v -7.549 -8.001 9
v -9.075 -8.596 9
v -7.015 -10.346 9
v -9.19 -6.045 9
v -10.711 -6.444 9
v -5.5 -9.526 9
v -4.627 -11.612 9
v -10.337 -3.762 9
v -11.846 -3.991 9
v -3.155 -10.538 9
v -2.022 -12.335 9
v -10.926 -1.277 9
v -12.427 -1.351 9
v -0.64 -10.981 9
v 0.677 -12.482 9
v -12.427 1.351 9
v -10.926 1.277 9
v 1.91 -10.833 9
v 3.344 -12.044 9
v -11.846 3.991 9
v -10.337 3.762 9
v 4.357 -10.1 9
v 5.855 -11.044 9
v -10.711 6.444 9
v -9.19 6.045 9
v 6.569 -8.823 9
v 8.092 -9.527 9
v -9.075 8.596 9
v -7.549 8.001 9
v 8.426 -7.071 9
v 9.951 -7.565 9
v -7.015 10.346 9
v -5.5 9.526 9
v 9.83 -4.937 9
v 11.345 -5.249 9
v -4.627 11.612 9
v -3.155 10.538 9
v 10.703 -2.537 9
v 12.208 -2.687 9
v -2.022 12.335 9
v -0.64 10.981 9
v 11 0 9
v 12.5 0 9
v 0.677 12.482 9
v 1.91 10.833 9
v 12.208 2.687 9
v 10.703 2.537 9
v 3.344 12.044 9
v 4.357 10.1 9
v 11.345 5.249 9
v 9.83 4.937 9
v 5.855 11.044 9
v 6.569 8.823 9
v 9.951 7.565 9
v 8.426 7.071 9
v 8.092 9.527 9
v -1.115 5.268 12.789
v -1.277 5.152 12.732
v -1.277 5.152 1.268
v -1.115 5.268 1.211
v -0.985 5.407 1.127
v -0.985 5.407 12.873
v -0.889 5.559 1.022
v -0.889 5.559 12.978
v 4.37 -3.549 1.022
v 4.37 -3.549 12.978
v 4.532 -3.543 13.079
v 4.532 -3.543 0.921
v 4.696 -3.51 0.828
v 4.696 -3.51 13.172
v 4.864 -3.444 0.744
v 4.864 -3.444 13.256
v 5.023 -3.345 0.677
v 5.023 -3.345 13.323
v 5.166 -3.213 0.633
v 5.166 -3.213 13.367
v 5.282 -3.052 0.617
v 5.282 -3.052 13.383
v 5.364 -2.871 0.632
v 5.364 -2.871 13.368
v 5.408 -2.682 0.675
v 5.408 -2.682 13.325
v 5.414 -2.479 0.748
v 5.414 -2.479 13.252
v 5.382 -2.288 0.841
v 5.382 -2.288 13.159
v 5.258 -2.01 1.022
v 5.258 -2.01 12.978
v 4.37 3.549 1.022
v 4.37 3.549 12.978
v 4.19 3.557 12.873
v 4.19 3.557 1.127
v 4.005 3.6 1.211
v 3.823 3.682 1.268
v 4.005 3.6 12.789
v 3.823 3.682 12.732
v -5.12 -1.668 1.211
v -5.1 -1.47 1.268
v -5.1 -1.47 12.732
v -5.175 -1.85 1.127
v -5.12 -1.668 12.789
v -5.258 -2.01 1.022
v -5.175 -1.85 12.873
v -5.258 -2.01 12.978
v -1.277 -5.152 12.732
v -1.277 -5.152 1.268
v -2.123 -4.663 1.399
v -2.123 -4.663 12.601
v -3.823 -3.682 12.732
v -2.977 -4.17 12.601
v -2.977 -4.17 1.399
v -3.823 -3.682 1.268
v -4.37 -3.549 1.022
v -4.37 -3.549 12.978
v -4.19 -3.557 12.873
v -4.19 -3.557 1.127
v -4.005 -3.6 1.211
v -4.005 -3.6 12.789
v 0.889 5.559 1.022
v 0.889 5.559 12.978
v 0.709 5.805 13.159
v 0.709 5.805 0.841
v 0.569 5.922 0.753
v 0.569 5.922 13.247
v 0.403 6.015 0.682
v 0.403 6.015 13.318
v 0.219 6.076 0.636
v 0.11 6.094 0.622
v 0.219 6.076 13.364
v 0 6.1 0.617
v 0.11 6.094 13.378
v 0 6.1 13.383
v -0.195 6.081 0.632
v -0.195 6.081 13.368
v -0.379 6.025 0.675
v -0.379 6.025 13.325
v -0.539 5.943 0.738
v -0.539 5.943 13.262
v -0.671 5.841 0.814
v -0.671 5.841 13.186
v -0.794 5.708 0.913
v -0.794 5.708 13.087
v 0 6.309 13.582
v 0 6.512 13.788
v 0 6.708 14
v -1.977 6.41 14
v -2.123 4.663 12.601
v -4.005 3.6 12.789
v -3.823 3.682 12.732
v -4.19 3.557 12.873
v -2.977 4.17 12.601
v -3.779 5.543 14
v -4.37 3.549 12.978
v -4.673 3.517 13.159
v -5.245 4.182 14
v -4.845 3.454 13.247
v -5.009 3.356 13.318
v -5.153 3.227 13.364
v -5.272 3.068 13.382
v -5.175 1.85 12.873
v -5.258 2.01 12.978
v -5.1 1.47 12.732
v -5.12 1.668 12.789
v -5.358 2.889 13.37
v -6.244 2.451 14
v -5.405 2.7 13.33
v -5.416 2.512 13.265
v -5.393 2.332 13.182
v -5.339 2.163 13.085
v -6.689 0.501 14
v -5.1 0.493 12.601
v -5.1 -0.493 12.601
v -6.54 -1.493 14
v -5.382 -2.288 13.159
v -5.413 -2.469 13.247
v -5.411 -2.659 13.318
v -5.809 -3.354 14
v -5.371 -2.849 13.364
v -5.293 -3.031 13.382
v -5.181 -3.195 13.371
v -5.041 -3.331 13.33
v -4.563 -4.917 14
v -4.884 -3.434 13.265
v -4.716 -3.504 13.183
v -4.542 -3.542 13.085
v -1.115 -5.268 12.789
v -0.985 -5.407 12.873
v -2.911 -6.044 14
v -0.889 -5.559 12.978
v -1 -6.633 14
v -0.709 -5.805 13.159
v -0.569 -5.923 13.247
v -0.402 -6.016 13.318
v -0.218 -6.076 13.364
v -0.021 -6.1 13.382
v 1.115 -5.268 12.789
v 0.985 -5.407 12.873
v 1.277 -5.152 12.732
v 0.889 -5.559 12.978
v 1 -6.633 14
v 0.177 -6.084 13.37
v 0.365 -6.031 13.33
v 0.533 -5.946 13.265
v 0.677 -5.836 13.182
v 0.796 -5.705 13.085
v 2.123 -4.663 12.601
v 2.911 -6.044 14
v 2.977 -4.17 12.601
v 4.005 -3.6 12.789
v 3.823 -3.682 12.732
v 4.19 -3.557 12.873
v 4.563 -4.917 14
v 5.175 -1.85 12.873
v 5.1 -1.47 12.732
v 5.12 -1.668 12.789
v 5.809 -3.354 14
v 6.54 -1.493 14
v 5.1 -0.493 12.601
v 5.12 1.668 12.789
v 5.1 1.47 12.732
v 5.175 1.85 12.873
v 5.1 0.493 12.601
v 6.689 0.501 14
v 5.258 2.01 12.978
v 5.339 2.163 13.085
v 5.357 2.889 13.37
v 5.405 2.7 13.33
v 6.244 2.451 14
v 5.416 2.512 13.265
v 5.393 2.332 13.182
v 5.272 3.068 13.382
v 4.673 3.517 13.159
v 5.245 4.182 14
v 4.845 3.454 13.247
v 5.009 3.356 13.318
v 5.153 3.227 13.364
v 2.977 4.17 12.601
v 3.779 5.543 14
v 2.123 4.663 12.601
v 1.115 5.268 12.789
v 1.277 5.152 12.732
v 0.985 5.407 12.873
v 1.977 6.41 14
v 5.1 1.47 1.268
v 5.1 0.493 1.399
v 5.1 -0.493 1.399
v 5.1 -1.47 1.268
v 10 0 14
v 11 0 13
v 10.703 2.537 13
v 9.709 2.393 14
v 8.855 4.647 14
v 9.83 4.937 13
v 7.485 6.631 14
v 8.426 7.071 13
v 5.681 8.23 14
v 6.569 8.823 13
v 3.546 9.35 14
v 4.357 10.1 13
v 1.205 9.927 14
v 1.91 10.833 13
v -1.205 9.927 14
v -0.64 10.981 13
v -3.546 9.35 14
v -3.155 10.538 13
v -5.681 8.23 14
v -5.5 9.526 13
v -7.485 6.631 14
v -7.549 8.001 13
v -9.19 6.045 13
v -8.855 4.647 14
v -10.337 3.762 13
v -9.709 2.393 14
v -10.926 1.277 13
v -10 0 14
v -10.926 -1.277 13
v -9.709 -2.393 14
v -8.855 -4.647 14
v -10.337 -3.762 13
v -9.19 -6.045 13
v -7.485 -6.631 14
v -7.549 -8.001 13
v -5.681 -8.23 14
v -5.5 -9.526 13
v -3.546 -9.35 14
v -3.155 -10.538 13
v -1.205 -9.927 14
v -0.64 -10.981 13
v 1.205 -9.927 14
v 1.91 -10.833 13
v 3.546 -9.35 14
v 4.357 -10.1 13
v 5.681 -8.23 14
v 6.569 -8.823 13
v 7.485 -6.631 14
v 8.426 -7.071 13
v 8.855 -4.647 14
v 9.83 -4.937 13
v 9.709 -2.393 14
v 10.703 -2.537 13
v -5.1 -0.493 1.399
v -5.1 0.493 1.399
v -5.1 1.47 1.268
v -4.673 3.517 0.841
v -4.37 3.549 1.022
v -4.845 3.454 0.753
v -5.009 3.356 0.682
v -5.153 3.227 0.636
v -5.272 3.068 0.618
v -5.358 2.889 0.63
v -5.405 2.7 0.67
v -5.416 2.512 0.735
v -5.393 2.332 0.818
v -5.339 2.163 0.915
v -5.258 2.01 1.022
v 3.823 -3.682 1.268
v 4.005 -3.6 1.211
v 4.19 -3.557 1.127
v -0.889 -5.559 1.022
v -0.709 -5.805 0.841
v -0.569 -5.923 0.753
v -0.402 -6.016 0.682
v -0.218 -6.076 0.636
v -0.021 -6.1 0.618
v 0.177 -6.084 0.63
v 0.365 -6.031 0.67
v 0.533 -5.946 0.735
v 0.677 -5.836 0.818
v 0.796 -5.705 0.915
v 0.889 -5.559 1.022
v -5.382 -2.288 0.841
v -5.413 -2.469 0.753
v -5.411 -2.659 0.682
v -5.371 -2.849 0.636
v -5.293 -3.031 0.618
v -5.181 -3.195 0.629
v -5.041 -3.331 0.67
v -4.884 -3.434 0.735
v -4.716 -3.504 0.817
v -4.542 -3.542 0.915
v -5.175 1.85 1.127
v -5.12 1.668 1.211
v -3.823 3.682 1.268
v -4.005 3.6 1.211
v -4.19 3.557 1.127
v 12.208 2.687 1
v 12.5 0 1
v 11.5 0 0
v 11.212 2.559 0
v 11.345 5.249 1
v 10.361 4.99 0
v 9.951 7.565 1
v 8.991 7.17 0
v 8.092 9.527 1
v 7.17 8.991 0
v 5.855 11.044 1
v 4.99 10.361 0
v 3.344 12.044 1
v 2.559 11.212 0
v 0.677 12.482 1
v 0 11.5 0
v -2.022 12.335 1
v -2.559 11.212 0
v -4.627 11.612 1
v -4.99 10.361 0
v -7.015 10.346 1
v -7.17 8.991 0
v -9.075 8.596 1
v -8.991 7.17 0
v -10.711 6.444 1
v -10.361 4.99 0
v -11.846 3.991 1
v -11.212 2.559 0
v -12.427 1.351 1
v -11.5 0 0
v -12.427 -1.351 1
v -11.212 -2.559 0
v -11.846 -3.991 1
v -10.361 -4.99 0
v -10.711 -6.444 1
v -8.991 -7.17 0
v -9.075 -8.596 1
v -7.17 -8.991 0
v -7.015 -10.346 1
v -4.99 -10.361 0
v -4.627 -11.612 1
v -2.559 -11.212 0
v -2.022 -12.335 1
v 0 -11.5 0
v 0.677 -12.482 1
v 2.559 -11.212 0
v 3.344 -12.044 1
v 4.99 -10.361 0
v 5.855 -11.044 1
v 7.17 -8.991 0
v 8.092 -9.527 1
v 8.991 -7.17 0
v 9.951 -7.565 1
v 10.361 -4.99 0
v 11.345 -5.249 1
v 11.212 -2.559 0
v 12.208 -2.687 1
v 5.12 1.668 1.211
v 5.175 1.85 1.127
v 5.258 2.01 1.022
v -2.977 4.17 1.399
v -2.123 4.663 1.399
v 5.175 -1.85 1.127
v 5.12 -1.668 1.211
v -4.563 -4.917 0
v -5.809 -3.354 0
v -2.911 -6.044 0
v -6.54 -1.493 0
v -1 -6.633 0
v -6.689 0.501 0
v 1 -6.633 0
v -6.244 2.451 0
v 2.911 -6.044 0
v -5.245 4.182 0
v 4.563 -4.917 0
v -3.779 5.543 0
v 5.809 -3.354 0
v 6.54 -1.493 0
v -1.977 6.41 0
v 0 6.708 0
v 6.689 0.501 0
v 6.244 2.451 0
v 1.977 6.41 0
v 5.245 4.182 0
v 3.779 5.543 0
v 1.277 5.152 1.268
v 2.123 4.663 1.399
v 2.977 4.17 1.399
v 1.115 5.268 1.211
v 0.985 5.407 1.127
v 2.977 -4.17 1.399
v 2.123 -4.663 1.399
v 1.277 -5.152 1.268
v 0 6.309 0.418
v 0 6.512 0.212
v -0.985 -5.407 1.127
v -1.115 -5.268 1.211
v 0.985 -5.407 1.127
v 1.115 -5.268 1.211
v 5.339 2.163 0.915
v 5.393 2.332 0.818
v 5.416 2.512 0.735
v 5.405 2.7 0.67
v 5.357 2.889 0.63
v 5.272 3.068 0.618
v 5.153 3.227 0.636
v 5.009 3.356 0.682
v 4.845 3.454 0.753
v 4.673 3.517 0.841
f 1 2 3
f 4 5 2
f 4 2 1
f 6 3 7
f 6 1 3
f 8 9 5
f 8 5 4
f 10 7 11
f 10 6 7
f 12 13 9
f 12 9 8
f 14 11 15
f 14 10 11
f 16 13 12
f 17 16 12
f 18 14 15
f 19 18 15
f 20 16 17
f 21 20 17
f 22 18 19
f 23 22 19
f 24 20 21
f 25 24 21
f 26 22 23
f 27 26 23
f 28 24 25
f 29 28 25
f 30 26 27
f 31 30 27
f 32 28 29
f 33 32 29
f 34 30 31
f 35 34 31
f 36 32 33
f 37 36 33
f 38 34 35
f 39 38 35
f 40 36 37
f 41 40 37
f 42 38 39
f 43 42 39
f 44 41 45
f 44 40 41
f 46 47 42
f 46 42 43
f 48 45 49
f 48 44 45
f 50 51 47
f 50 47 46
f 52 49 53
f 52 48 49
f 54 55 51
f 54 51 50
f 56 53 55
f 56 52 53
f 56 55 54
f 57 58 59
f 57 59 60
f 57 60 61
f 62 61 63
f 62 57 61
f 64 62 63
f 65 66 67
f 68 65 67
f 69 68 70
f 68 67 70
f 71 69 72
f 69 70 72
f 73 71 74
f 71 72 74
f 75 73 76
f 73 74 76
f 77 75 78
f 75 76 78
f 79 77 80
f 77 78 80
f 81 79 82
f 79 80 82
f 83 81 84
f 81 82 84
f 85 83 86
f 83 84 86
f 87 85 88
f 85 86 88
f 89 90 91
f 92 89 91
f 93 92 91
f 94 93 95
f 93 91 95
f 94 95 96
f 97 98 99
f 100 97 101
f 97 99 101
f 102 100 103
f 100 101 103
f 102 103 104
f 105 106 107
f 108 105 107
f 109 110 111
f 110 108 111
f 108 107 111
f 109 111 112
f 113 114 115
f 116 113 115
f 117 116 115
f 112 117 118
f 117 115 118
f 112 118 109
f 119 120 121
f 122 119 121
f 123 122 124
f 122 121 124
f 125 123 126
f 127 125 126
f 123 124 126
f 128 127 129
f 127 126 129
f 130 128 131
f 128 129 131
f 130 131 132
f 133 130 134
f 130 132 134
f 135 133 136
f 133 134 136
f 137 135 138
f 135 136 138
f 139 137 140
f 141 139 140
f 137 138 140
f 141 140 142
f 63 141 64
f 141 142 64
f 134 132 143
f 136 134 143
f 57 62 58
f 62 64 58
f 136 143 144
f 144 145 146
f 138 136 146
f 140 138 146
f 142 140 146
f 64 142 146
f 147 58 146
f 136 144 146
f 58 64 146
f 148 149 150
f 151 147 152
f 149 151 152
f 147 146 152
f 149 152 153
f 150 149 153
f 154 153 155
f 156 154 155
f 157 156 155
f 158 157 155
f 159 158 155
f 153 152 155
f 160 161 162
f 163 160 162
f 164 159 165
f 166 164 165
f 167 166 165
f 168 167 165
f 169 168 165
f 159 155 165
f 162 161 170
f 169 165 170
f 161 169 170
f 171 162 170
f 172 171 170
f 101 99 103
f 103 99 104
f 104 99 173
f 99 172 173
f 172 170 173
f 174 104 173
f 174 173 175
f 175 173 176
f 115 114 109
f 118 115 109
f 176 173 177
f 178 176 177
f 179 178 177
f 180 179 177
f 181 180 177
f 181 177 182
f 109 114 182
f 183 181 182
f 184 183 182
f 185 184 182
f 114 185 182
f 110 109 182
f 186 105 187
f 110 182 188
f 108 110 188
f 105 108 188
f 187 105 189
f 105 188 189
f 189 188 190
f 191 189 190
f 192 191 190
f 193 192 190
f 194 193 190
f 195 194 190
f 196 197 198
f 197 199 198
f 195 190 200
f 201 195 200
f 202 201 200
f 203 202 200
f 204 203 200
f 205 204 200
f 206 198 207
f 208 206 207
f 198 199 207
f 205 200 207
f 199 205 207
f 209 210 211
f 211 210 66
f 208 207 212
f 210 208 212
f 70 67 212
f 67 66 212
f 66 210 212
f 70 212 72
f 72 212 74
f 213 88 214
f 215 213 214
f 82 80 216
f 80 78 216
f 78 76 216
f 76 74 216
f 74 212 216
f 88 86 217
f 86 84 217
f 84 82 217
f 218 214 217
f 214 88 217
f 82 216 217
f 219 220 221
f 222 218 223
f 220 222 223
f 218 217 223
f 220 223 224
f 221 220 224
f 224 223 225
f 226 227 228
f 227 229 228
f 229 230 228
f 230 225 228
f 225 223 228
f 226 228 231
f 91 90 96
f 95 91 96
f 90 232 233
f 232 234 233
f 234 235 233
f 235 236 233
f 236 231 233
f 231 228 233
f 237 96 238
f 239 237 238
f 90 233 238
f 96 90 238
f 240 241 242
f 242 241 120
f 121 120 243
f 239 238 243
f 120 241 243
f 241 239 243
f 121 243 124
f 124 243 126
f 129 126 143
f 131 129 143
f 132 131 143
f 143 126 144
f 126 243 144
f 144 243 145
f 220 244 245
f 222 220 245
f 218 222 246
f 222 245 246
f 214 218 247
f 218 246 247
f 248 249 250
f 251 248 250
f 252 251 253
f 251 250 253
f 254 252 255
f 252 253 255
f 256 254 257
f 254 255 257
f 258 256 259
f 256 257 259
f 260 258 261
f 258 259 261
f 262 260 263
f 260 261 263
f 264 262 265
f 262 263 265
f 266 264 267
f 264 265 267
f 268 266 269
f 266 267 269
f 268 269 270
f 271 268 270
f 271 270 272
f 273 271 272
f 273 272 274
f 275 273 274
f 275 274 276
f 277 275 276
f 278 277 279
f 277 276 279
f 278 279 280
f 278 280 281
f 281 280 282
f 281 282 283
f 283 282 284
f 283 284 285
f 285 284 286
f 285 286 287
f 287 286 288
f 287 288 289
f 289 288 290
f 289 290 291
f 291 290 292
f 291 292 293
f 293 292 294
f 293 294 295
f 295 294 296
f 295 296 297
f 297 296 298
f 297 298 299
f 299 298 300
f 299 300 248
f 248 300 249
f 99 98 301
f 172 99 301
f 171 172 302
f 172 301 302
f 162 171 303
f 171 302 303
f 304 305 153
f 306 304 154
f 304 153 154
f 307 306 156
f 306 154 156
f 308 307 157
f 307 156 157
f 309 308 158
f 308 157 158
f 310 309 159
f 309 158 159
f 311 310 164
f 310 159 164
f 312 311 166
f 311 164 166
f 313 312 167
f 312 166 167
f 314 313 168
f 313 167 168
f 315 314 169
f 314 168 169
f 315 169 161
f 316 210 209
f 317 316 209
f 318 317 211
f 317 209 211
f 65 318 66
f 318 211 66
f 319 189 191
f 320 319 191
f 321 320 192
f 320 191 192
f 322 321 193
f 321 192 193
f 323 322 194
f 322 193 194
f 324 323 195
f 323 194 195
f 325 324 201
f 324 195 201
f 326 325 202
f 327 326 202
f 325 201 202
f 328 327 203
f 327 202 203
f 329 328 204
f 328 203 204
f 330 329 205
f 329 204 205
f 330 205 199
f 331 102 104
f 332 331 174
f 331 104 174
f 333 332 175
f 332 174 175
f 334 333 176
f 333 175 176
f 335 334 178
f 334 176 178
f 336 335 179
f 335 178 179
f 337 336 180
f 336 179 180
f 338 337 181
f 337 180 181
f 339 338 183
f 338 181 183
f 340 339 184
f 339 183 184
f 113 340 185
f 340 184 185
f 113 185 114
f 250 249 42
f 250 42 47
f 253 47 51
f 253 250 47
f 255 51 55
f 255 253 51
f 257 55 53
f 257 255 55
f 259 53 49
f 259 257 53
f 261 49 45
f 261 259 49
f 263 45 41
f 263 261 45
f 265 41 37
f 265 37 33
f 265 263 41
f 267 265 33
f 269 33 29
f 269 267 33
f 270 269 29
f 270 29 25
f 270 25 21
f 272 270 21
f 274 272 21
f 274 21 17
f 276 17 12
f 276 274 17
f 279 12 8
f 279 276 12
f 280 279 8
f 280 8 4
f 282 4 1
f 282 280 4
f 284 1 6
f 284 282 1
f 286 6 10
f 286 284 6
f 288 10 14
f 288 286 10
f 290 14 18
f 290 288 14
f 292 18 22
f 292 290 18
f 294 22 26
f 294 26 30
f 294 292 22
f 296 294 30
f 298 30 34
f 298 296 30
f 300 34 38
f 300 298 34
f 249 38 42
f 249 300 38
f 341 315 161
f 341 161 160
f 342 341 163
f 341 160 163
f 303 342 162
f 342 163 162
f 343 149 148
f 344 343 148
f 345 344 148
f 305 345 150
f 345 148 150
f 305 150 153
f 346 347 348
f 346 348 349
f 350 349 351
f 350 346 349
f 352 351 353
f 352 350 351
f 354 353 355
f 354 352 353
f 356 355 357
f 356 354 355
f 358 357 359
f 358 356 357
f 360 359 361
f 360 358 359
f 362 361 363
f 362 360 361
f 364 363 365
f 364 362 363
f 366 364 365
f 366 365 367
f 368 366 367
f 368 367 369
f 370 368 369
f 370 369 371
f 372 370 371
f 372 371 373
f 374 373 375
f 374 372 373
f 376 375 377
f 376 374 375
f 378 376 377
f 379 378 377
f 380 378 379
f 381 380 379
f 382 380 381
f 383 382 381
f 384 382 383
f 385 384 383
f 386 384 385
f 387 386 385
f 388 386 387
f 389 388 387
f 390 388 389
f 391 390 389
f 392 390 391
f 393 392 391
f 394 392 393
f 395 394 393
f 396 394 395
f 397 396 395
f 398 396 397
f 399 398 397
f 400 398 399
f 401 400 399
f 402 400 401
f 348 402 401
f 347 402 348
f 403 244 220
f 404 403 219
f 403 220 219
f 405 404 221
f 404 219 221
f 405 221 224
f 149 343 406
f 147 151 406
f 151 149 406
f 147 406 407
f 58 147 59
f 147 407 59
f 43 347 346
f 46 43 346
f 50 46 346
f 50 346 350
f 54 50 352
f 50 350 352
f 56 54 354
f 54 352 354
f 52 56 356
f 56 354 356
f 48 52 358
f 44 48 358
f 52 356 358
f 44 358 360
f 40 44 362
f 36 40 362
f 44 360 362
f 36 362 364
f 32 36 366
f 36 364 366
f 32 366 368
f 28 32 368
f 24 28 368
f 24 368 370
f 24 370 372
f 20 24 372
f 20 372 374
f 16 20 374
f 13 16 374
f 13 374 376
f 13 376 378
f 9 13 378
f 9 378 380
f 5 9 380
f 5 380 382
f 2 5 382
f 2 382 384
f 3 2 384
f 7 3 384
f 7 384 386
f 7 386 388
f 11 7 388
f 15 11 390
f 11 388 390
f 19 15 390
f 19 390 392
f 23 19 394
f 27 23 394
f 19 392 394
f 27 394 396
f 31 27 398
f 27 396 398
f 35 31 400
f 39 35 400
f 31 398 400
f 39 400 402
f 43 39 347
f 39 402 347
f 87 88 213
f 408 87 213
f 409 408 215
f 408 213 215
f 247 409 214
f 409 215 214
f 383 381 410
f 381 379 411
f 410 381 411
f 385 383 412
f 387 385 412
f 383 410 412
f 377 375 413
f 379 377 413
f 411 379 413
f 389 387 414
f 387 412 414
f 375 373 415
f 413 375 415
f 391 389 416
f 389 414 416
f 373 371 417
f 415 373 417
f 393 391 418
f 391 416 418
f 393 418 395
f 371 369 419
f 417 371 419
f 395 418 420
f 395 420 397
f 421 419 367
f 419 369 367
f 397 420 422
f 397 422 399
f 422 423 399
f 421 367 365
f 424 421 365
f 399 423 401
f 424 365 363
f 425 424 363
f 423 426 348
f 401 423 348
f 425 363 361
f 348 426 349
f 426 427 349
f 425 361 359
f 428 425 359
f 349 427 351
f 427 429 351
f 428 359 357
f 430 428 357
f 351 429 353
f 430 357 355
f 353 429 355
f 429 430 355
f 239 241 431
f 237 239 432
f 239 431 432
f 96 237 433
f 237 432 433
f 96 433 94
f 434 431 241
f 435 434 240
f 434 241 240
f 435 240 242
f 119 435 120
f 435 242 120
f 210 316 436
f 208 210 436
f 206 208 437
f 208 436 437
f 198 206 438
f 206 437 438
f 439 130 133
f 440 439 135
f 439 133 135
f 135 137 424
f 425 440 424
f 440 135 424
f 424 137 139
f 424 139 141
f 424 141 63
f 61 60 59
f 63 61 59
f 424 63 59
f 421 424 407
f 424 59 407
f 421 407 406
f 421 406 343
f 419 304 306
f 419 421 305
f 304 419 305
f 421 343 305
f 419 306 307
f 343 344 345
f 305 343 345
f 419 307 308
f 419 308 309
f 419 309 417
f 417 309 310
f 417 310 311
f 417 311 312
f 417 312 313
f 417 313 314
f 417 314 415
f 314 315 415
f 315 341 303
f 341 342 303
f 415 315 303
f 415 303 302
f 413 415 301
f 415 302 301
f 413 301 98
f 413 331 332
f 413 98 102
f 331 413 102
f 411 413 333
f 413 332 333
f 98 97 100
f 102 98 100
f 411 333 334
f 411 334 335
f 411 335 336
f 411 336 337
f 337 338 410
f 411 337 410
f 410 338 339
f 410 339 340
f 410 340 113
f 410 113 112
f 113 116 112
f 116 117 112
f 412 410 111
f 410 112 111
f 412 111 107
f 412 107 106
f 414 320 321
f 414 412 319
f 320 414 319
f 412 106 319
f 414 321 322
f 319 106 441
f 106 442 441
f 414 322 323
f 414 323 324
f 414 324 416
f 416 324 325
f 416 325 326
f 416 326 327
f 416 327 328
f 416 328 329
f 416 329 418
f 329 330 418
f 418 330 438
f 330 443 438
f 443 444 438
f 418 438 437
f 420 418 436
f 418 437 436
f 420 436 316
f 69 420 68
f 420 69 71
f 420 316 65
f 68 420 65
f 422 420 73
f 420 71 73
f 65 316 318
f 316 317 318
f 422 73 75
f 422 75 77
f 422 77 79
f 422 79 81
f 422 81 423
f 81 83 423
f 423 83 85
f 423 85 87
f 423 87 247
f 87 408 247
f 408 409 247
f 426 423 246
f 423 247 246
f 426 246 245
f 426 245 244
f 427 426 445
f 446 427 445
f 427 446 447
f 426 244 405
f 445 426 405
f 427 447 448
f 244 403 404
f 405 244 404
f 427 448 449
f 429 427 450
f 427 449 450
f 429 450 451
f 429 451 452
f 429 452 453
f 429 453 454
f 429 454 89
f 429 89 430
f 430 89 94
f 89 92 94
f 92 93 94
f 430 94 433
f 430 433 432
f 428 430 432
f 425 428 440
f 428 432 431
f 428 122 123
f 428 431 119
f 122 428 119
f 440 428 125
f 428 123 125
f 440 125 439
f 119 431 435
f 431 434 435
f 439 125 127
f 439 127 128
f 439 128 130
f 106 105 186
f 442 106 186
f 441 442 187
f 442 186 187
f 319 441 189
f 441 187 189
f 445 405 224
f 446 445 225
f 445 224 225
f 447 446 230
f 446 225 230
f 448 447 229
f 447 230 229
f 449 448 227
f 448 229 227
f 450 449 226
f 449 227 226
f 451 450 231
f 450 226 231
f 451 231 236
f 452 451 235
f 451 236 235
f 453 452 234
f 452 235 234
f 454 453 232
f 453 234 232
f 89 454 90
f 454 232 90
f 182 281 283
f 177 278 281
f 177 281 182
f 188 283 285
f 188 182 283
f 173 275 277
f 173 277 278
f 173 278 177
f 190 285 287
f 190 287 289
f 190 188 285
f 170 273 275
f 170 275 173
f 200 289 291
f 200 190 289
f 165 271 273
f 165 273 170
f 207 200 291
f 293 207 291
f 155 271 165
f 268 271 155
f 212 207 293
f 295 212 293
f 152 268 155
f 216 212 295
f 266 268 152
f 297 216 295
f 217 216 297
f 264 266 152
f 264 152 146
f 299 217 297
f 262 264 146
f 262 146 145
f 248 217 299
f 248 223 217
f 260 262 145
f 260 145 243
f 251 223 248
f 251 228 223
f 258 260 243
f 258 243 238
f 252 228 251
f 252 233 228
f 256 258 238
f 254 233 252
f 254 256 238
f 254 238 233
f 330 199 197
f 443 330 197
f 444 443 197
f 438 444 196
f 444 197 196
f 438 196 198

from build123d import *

# Parameters (mm, degrees)
F0_R     = 12.5
F1_DEPTH = 14
F2_R     = 12.5
F2_R_2   = 11
F3_DEPTH = 5
F4_R     = 1
F5_DEPTH = 14.001
F6_R     = 1
F7_SIZE  = 1


with BuildPart() as f1:
    # F0 (on Top) → F1 (new body)
    with BuildSketch(Plane.XY):
        Circle(F0_R)
        Polygon((5.1, 2.9444863729), (5.1, -2.9444863729), (0, -5.8889727457), (-5.1, -2.9444863729), (-5.1, 2.9444863729), (0, 5.8889727457), align=None, mode=Mode.SUBTRACT)
    extrude(amount=F1_DEPTH)

    # F2 (on face) → F3 (cut)
    with BuildSketch(Plane.XY.offset(14)):
        Circle(F2_R)
        Circle(F2_R_2, mode=Mode.SUBTRACT)
    extrude(amount=-F3_DEPTH, mode=Mode.SUBTRACT)

    # F4 (on face) → F5 (cut, through all)
    with BuildSketch(Plane.XY.offset(14)):
        with Locations((0, 5.1)):
            Circle(F4_R)
        with Locations((-4.4167295593, 2.55)):
            Circle(F4_R)
        with Locations((-4.4167295593, -2.55)):
            Circle(F4_R)
        with Locations((0, -5.1)):
            Circle(F4_R)
        with Locations((4.4167295593, -2.55)):
            Circle(F4_R)
        with Locations((4.4167295593, 2.55)):
            Circle(F4_R)
    extrude(amount=-F5_DEPTH, mode=Mode.SUBTRACT)

    # F6
    f6_edges = [f1.edges().sort_by_distance(p)[0] for p in [
        (-5.1, 1.819835, 7),
        (-5.1, -1.819835, 7),
        (-4.126023, -3.506812, 7),
        (-0.973977, -5.326647, 7),
        (0.973977, -5.326647, 7),
        (4.126023, -3.506812, 7),
        (5.1, -1.819835, 7),
        (5.1, 1.819835, 7),
        (4.126023, 3.506812, 7),
        (0.973977, 5.326647, 7),
        (-0.973977, 5.326647, 7),
        (-4.126023, 3.506812, 7),
    ]]
    fillet(f6_edges, radius=F6_R)

    # F7
    f7_edges = [f1.edges().sort_by_distance(p)[0] for p in [
        (-11, 0, 14),
        (-12.5, 0, 0),
    ]]
    chamfer(f7_edges, length=F7_SIZE)

    # F8 (on Right) → F9 (revolve, cut)
    with BuildSketch(Plane.YZ):
        with BuildLine():
            Line((0, 3), (0, -15))
            ThreePointArc((0, -15), (9, -6), (0, 3))
        make_face()
        with BuildLine():
            Line((0, 29), (0, 11))
            ThreePointArc((0, 11), (9, 20), (0, 29))
        make_face()
    revolve(axis=Axis((0, 0, -6), (0, 0, 1)), mode=Mode.SUBTRACT)


solid = f1.part
